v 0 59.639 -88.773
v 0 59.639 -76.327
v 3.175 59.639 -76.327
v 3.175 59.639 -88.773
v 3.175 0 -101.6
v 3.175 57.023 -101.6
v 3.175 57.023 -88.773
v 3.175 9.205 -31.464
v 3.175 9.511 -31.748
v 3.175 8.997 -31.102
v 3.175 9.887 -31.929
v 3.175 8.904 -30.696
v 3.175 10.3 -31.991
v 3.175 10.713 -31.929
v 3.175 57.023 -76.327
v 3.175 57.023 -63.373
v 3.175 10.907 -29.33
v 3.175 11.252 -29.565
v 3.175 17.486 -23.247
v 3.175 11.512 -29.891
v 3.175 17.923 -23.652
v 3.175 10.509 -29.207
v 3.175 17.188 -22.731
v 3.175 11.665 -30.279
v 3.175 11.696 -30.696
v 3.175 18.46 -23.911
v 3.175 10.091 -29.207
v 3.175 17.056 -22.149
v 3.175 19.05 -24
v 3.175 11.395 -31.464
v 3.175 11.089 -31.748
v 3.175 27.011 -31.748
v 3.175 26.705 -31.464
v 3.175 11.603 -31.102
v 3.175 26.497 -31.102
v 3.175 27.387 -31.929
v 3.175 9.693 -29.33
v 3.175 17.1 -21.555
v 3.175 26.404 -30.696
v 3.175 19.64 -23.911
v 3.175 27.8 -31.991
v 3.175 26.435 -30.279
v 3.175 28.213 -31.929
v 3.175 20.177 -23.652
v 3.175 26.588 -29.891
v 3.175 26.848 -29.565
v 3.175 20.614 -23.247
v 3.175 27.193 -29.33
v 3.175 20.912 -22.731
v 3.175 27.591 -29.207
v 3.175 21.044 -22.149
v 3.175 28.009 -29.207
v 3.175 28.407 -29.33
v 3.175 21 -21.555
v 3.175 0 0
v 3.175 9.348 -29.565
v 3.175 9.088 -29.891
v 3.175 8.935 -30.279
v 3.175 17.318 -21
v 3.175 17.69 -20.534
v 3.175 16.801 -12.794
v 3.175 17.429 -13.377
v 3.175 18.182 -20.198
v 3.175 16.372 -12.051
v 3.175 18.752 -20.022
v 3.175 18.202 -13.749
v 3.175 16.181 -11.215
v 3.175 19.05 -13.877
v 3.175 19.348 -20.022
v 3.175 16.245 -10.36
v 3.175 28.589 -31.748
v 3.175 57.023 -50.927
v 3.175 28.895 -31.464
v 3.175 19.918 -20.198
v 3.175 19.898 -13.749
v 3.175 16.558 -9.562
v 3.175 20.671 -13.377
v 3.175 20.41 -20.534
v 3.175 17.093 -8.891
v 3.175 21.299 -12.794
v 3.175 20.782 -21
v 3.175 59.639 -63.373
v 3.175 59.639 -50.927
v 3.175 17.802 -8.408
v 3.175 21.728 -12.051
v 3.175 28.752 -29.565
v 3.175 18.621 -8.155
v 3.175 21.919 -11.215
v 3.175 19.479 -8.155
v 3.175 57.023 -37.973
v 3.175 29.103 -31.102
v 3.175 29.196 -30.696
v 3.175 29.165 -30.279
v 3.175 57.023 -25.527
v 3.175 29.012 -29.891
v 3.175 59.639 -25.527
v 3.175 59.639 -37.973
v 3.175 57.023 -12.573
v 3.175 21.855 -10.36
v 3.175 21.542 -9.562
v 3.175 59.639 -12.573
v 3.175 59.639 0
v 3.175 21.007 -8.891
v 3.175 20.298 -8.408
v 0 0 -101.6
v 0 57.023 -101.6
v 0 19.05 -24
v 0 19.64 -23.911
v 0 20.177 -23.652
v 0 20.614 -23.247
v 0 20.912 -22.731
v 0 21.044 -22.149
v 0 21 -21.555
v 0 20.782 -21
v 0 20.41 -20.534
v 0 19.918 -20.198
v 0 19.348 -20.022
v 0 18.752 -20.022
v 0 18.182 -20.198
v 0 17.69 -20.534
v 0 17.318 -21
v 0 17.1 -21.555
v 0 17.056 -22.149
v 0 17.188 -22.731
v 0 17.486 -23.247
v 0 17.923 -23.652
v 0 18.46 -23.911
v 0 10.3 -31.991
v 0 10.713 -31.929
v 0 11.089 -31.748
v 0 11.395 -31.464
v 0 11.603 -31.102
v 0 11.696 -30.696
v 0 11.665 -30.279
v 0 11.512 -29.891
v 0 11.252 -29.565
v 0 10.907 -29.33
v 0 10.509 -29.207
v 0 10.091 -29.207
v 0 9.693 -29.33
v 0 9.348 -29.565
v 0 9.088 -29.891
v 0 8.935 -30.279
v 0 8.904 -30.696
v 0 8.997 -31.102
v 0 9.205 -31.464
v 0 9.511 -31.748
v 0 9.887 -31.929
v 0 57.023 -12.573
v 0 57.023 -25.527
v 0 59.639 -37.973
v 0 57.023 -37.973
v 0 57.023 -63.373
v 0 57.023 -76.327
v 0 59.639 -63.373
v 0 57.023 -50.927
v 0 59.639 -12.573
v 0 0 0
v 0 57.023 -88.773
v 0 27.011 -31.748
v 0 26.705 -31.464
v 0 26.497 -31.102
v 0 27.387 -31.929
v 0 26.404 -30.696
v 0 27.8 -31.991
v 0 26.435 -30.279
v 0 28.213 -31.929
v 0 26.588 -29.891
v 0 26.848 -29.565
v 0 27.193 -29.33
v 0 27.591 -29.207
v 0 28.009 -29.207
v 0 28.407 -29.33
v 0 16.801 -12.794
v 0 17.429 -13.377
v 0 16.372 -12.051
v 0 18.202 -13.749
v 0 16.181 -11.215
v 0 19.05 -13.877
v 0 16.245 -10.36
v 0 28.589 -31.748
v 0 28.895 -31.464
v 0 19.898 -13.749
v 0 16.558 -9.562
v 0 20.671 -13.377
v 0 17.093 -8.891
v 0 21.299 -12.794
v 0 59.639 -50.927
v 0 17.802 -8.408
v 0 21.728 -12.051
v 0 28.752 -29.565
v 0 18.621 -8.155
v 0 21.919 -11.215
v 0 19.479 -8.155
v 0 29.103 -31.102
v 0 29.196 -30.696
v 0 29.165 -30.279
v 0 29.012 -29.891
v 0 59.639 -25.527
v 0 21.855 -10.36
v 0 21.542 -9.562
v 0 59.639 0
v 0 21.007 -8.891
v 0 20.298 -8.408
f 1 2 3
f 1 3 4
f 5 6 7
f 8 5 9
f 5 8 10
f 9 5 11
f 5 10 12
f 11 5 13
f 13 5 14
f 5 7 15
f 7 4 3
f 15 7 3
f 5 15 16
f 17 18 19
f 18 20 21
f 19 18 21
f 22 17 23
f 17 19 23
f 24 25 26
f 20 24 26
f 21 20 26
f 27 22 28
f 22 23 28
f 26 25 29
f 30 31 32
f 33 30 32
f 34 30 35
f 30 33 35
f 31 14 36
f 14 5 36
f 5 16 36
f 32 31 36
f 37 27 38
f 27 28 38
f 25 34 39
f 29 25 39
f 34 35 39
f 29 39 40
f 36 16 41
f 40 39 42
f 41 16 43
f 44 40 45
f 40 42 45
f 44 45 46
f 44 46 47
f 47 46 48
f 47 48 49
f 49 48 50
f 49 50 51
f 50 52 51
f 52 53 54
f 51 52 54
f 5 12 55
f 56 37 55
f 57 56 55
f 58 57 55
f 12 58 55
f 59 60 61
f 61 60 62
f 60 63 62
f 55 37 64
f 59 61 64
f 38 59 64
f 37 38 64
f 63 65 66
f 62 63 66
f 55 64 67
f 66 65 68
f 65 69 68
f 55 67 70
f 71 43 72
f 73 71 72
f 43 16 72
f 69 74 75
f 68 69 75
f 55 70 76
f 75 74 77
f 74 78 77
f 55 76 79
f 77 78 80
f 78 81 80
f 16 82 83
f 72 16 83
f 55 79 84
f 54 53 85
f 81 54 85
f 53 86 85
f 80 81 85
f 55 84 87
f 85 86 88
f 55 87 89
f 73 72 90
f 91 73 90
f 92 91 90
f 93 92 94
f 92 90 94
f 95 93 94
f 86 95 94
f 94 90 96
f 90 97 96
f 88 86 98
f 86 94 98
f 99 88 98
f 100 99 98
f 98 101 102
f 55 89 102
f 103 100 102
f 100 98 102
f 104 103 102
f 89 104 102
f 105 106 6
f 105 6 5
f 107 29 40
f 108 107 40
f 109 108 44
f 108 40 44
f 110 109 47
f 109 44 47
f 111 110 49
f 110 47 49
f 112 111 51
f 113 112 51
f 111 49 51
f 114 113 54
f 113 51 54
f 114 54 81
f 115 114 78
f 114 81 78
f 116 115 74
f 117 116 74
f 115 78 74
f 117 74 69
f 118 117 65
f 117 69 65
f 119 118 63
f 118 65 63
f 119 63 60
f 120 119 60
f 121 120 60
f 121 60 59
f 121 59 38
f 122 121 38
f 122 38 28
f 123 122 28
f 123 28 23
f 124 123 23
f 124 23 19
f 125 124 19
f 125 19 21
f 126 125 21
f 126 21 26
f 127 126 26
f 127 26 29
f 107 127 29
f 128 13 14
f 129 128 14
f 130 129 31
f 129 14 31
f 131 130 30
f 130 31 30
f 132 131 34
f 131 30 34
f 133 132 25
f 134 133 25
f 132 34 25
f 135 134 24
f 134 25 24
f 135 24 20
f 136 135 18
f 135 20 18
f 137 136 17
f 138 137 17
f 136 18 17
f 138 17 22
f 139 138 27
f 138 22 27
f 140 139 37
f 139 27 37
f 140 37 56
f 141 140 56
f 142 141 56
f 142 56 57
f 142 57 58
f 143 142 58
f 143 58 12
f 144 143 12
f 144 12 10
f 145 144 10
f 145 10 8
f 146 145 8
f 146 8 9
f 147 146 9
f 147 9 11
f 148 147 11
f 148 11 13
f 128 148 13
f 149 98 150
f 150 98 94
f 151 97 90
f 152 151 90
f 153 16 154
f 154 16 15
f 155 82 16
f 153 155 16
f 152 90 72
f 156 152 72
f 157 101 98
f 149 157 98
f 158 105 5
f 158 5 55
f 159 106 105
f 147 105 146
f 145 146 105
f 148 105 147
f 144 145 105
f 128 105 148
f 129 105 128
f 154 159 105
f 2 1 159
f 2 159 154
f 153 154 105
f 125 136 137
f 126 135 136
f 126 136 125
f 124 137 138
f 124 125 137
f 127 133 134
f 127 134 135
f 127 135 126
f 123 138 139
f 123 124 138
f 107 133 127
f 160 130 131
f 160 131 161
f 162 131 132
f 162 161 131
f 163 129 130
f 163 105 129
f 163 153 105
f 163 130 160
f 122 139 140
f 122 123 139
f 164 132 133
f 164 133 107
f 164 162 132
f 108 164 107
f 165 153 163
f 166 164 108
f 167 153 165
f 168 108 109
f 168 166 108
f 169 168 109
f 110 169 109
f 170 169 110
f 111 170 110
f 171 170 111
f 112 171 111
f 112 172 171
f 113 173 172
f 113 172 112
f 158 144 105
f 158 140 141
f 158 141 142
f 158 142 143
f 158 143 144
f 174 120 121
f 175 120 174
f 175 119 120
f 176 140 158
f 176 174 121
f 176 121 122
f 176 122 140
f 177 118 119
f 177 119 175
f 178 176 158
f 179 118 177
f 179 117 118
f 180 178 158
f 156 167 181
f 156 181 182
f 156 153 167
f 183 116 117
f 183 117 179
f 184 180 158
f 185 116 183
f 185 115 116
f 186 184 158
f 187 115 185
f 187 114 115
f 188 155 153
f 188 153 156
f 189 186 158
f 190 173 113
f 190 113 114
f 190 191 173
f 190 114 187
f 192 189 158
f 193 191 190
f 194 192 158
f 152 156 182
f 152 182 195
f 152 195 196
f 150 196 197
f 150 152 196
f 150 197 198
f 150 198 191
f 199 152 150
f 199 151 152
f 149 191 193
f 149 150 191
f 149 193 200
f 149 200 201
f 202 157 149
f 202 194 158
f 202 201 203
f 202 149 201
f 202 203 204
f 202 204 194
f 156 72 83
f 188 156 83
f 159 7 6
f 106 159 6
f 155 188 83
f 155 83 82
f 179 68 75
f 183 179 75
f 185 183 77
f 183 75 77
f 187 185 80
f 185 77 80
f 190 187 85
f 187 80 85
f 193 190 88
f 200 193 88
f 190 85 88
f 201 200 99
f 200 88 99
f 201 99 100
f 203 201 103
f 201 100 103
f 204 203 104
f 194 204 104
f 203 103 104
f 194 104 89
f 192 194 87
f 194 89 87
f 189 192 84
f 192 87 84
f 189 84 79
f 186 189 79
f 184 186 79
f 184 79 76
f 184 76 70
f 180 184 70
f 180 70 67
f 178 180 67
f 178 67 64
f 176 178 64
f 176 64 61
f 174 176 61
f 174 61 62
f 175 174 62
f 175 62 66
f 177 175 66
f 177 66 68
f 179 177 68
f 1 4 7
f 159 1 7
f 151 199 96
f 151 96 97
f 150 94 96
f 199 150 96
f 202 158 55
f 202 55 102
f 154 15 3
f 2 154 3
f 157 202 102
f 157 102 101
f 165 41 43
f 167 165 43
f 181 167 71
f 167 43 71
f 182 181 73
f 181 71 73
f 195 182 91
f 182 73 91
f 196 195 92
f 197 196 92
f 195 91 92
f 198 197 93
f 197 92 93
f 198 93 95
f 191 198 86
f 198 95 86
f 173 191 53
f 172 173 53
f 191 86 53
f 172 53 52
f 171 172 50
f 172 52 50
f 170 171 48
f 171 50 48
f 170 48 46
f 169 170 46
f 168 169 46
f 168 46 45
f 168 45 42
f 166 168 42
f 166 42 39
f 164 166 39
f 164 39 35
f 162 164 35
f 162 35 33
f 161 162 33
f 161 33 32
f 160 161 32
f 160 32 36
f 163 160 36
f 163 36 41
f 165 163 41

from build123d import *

# Parameters (mm, degrees)
BOSS_EXTRUDE1_DEPTH = 3.175
CUT_EXTRUDE1_REACH  = 5.175
SKETCH2_R           = 1.4
SKETCH2_R_2         = 2
SKETCH2_R_3         = 2.876999961
CUT_EXTRUDE2_DEPTH  = 4.175


with BuildPart() as part:
    # Sketch1 → Boss-Extrude1 (new body)
    with BuildSketch(Plane(origin=(0, 0, 0), x_dir=(0, 0, -1), z_dir=(1, 0, 0))):
        Polygon((0, 0), (0, 59.6392), (12.7, 59.6392), (12.7, 57.15), (25.4, 57.15), (25.4, 59.6392), (38.1, 59.6392), (38.1, 57.15), (50.8, 57.15), (50.8, 59.6392), (63.5, 59.6392), (63.5, 57.15), (76.2, 57.15), (76.2, 59.6392), (88.9, 59.6392), (88.9, 57.15), (101.6, 57.15), (101.6, 0), align=None)
    extrude(amount=BOSS_EXTRUDE1_DEPTH)

    # Sketch2 → Cut-Extrude1 (cut, up to next)
    with BuildSketch(Plane(origin=(3.175, 0, 0), x_dir=(0, 0, -1), z_dir=(1, 0, 0)), mode=Mode.PRIVATE) as cut_extrude1_sk1:
        with Locations((30.59102, 10.3)):
            Circle(SKETCH2_R)
    cut_extrude1_tool1 = extrude(cut_extrude1_sk1.sketch, amount=-CUT_EXTRUDE1_REACH, mode=Mode.PRIVATE) & part.part
    add(cut_extrude1_tool1.solids().sort_by_distance((3.175, 10.3, -30.59102))[0], mode=Mode.SUBTRACT)
    # Sketch2 → Cut-Extrude1 (cut, up to next)
    with BuildSketch(Plane(origin=(3.175, 0, 0), x_dir=(0, 0, -1), z_dir=(1, 0, 0)), mode=Mode.PRIVATE) as cut_extrude1_sk2:
        with Locations((30.59102, 27.8)):
            Circle(SKETCH2_R)
    cut_extrude1_tool2 = extrude(cut_extrude1_sk2.sketch, amount=-CUT_EXTRUDE1_REACH, mode=Mode.PRIVATE) & part.part
    add(cut_extrude1_tool2.solids().sort_by_distance((3.175, 27.8, -30.59102))[0], mode=Mode.SUBTRACT)
    # Sketch2 → Cut-Extrude1 (cut, up to next)
    with BuildSketch(Plane(origin=(3.175, 0, 0), x_dir=(0, 0, -1), z_dir=(1, 0, 0)), mode=Mode.PRIVATE) as cut_extrude1_sk3:
        with Locations((22.0000034, 19.05)):
            Circle(SKETCH2_R_2)
    cut_extrude1_tool3 = extrude(cut_extrude1_sk3.sketch, amount=-CUT_EXTRUDE1_REACH, mode=Mode.PRIVATE) & part.part
    add(cut_extrude1_tool3.solids().sort_by_distance((3.175, 19.05, -22.000003))[0], mode=Mode.SUBTRACT)
    # Sketch2 → Cut-Extrude1 (cut, up to next)
    with BuildSketch(Plane(origin=(3.175, 0, 0), x_dir=(0, 0, -1), z_dir=(1, 0, 0)), mode=Mode.PRIVATE) as cut_extrude1_sk4:
        with Locations((11, 19.05)):
            Circle(SKETCH2_R_3)
    cut_extrude1_tool4 = extrude(cut_extrude1_sk4.sketch, amount=-CUT_EXTRUDE1_REACH, mode=Mode.PRIVATE) & part.part
    add(cut_extrude1_tool4.solids().sort_by_distance((3.175, 19.05, -11))[0], mode=Mode.SUBTRACT)

    # Sketch3 → Cut-Extrude2 (cut, through all)
    with BuildSketch(Plane(origin=(3.175, 0, 0), x_dir=(0, 0, -1), z_dir=(1, 0, 0))):
        Polygon((12.7, 57.15), (12.7, 59.6392), (12.573, 59.6392), (12.573, 57.023), (25.527, 57.023), (25.527, 59.6392), (25.4, 59.6392), (25.4, 57.15), align=None)
        Polygon((38.1, 59.6392), (37.973, 59.6392), (37.973, 57.023), (50.927, 57.023), (50.927, 59.6392), (50.8, 59.6392), (50.8, 57.15), (38.1, 57.15), align=None)
        Polygon((63.5, 59.6392), (63.373, 59.6392), (63.373, 57.023), (76.327, 57.023), (76.327, 59.6392), (76.2, 59.6392), (76.2, 57.15), (63.5, 57.15), align=None)
        Polygon((88.9, 59.6392), (88.773, 59.6392), (88.773, 57.023), (101.6, 57.023), (101.6, 57.15), (88.9, 57.15), align=None)
    extrude(amount=-CUT_EXTRUDE2_DEPTH, mode=Mode.SUBTRACT)


solid = part.part
